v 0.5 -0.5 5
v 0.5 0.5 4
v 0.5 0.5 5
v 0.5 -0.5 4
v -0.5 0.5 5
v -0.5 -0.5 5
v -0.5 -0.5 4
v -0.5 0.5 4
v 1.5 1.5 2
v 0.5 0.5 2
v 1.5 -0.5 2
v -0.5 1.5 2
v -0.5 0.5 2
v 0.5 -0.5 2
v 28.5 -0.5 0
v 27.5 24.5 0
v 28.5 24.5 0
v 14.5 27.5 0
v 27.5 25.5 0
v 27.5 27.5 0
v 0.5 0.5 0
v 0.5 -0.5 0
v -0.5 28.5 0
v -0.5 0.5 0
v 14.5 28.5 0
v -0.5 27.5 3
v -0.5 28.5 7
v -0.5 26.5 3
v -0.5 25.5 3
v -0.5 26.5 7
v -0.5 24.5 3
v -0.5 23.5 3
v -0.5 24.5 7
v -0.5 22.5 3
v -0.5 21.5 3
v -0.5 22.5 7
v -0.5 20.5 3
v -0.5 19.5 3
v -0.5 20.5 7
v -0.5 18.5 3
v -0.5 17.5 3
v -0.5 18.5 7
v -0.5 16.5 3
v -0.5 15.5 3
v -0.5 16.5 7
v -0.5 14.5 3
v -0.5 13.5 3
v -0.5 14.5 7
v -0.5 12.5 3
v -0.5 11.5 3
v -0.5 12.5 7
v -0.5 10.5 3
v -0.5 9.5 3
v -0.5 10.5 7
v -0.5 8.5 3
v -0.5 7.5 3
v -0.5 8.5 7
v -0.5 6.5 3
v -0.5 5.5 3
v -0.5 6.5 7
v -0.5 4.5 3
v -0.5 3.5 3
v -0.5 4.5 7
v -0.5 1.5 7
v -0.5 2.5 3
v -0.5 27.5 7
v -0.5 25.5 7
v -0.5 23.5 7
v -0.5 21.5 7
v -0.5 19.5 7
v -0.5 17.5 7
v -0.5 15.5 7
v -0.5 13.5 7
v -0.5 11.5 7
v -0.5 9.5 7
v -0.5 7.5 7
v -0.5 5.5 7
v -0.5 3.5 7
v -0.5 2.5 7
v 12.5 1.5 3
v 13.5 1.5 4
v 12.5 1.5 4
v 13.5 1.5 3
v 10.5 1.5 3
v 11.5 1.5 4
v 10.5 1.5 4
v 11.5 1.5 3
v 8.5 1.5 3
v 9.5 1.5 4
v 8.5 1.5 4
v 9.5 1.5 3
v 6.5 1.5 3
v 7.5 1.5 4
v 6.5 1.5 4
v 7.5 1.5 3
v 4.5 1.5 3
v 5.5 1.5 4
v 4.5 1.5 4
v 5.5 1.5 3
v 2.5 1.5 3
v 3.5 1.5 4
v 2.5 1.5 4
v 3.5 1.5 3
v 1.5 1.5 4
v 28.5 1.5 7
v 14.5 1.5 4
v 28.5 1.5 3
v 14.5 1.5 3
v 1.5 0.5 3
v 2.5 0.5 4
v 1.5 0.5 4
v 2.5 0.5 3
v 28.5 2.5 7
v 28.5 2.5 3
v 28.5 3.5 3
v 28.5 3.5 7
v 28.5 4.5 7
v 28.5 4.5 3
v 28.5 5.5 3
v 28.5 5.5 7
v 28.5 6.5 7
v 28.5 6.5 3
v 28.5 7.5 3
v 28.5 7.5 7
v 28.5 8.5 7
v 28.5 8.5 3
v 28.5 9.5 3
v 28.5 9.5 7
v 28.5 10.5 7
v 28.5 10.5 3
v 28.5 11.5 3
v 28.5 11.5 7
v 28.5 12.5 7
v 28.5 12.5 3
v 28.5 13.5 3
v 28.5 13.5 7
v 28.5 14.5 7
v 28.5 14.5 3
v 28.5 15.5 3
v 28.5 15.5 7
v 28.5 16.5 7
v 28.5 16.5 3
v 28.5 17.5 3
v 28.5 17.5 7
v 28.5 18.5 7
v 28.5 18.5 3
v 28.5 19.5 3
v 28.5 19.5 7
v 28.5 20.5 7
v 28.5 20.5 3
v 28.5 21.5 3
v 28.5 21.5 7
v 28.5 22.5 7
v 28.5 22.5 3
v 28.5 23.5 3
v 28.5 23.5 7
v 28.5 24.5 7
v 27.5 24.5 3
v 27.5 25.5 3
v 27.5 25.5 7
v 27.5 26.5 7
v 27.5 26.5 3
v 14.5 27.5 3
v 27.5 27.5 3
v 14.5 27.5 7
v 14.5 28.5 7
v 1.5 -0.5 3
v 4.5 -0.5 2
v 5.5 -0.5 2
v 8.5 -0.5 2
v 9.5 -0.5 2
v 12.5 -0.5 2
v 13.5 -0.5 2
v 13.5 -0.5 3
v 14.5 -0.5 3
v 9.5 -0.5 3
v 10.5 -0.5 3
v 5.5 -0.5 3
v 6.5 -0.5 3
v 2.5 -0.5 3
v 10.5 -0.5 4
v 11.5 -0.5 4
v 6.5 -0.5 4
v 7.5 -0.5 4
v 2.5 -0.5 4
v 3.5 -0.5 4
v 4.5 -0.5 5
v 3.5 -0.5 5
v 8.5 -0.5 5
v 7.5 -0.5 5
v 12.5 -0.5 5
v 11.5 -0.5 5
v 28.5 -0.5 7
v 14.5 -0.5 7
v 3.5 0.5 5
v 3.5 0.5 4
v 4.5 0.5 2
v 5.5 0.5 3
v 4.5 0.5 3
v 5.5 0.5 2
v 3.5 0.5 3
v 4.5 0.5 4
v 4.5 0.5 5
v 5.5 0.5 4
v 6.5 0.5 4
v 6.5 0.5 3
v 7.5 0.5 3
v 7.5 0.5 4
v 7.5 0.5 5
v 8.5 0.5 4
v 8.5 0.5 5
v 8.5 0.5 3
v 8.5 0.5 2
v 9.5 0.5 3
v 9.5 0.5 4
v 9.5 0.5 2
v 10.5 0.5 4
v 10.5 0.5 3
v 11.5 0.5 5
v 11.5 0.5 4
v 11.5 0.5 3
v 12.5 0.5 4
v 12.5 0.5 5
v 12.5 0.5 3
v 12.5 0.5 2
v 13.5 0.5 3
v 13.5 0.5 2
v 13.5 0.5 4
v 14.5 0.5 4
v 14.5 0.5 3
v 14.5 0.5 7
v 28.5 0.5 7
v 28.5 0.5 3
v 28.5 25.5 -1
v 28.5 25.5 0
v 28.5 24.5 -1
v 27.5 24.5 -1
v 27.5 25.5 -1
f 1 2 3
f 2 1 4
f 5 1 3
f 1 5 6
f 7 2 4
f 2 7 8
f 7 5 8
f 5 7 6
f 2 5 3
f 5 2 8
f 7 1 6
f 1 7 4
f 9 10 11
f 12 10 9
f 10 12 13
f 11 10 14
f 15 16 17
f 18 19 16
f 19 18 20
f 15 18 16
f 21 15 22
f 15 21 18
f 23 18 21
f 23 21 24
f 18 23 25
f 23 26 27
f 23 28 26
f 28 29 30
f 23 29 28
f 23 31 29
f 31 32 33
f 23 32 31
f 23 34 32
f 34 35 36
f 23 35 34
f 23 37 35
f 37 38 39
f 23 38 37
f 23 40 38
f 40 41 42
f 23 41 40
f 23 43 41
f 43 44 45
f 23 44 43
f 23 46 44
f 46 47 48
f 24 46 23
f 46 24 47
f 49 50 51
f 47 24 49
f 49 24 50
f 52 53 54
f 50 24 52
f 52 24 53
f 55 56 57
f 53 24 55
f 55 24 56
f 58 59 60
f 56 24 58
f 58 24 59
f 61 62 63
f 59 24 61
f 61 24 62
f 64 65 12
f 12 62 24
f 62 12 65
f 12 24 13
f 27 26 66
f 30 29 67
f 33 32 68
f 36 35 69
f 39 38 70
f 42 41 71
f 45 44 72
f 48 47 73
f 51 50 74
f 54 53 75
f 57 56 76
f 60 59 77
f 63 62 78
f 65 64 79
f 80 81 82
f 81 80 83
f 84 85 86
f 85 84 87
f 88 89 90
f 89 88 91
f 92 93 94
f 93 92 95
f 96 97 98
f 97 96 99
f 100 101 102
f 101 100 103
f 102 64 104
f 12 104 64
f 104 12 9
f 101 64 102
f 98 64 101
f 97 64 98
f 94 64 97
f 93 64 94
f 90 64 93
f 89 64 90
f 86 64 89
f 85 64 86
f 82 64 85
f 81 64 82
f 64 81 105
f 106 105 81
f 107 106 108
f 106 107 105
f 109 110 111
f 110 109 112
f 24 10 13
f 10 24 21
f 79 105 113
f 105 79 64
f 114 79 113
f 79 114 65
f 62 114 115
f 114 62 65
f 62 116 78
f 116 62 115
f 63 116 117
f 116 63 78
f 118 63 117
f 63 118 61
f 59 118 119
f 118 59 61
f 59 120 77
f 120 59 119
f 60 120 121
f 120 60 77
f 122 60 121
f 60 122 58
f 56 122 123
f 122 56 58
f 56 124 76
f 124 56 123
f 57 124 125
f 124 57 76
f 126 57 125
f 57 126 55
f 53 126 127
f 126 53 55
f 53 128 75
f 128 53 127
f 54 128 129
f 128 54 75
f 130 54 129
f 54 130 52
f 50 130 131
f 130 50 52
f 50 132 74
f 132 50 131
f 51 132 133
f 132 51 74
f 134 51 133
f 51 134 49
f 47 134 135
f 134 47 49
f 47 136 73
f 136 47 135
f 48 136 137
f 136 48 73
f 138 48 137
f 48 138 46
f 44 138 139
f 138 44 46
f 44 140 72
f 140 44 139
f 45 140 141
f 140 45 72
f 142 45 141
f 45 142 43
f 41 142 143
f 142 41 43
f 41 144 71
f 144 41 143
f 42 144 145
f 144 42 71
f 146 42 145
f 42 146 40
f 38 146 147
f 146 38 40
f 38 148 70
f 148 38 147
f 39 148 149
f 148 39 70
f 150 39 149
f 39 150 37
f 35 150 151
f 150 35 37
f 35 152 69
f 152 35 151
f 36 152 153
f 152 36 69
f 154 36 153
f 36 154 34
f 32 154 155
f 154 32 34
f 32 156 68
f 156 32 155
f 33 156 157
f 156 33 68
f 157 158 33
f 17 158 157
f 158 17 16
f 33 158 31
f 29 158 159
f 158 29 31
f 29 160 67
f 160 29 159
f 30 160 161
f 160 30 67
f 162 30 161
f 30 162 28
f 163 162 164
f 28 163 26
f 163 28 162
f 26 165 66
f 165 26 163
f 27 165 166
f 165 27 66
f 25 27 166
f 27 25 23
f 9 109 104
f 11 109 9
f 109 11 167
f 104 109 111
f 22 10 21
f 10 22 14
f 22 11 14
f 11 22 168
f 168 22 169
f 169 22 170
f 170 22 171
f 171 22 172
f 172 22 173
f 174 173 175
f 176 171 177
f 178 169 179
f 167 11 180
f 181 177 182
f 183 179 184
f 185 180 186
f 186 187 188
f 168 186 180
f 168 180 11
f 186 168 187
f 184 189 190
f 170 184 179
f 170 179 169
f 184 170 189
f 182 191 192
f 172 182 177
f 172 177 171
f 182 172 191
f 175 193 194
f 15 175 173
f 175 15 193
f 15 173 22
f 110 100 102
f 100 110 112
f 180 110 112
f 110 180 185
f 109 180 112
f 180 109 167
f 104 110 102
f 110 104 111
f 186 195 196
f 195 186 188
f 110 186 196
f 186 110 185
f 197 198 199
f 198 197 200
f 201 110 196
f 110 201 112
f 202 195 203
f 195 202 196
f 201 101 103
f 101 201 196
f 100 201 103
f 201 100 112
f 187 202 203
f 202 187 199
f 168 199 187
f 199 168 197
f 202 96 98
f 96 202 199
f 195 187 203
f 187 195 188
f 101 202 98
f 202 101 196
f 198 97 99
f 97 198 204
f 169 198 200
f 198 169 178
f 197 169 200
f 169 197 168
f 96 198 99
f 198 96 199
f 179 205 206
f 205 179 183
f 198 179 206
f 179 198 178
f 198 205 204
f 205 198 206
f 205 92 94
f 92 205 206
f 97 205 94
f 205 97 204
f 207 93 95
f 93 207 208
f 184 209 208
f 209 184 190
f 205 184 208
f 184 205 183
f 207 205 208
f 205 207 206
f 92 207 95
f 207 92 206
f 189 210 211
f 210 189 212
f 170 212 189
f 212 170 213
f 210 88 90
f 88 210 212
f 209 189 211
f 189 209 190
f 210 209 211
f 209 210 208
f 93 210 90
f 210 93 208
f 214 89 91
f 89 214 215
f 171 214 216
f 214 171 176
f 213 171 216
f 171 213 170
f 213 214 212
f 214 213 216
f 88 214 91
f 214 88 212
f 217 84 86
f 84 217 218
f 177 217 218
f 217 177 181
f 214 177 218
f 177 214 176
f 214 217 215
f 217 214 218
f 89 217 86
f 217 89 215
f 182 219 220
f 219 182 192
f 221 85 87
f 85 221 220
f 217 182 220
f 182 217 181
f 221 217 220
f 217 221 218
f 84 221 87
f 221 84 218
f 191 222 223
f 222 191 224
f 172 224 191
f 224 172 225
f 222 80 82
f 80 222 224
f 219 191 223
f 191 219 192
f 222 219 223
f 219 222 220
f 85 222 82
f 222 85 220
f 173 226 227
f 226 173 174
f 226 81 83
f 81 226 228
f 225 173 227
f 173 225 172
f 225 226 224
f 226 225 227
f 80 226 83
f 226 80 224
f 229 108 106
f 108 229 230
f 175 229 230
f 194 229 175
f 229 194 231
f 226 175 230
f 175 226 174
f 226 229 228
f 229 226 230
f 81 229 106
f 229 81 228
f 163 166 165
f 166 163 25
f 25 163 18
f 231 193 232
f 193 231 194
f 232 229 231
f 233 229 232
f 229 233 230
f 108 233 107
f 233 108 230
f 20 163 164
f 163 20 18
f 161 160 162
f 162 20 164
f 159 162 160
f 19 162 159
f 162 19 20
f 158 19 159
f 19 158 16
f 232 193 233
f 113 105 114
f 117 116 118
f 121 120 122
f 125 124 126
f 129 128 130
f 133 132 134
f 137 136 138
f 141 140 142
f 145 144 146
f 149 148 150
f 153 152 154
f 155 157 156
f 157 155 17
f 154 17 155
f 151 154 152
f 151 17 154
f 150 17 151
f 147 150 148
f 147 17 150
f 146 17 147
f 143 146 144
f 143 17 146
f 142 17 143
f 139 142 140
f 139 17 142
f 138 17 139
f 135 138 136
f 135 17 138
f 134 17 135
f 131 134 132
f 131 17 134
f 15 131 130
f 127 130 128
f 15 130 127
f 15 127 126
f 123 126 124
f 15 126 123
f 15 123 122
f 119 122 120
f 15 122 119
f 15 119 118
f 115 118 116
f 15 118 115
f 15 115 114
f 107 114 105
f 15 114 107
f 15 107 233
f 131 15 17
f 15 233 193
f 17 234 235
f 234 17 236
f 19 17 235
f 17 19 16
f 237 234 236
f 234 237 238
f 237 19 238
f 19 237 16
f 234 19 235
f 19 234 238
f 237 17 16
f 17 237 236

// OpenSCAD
union() {
    translate([0, 0, 4.5]) color([1, 0, 0]) cube([1, 1, 1], center=true);
    translate([0, 1, 1.0]) cube([1, 1, 2], center=true);
    translate([0, 2, 3.5]) cube([1, 1, 7], center=true);
    translate([0, 3, 1.5]) cube([1, 1, 3], center=true);
    translate([0, 4, 3.5]) cube([1, 1, 7], center=true);
    translate([0, 5, 1.5]) cube([1, 1, 3], center=true);
    translate([0, 6, 3.5]) cube([1, 1, 7], center=true);
    translate([0, 7, 1.5]) cube([1, 1, 3], center=true);
    translate([0, 8, 3.5]) cube([1, 1, 7], center=true);
    translate([0, 9, 1.5]) cube([1, 1, 3], center=true);
    translate([0, 10, 3.5]) cube([1, 1, 7], center=true);
    translate([0, 11, 1.5]) cube([1, 1, 3], center=true);
    translate([0, 12, 3.5]) cube([1, 1, 7], center=true);
    translate([0, 13, 1.5]) cube([1, 1, 3], center=true);
    translate([0, 14, 3.5]) cube([1, 1, 7], center=true);
    translate([0, 15, 1.5]) cube([1, 1, 3], center=true);
    translate([0, 16, 3.5]) cube([1, 1, 7], center=true);
    translate([0, 17, 1.5]) cube([1, 1, 3], center=true);
    translate([0, 18, 3.5]) cube([1, 1, 7], center=true);
    translate([0, 19, 1.5]) cube([1, 1, 3], center=true);
    translate([0, 20, 3.5]) cube([1, 1, 7], center=true);
    translate([0, 21, 1.5]) cube([1, 1, 3], center=true);
    translate([0, 22, 3.5]) cube([1, 1, 7], center=true);
    translate([0, 23, 1.5]) cube([1, 1, 3], center=true);
    translate([0, 24, 3.5]) cube([1, 1, 7], center=true);
    translate([0, 25, 1.5]) cube([1, 1, 3], center=true);
    translate([0, 26, 3.5]) cube([1, 1, 7], center=true);
    translate([0, 27, 1.5]) cube([1, 1, 3], center=true);
    translate([0, 28, 3.5]) cube([1, 1, 7], center=true);
    translate([1, 0, 1.0]) cube([1, 1, 2], center=true);
    translate([1, 1, 1.0]) cube([1, 1, 2], center=true);
    translate([1, 2, 3.5]) cube([1, 1, 7], center=true);
    translate([1, 3, 1.5]) cube([1, 1, 3], center=true);
    translate([1, 4, 3.5]) cube([1, 1, 7], center=true);
    translate([1, 5, 1.5]) cube([1, 1, 3], center=true);
    translate([1, 6, 3.5]) cube([1, 1, 7], center=true);
    translate([1, 7, 1.5]) cube([1, 1, 3], center=true);
    translate([1, 8, 3.5]) cube([1, 1, 7], center=true);
    translate([1, 9, 1.5]) cube([1, 1, 3], center=true);
    translate([1, 10, 3.5]) cube([1, 1, 7], center=true);
    translate([1, 11, 1.5]) cube([1, 1, 3], center=true);
    translate([1, 12, 3.5]) cube([1, 1, 7], center=true);
    translate([1, 13, 1.5]) cube([1, 1, 3], center=true);
    translate([1, 14, 3.5]) cube([1, 1, 7], center=true);
    translate([1, 15, 1.5]) cube([1, 1, 3], center=true);
    translate([1, 16, 3.5]) cube([1, 1, 7], center=true);
    translate([1, 17, 1.5]) cube([1, 1, 3], center=true);
    translate([1, 18, 3.5]) cube([1, 1, 7], center=true);
    translate([1, 19, 1.5]) cube([1, 1, 3], center=true);
    translate([1, 20, 3.5]) cube([1, 1, 7], center=true);
    translate([1, 21, 1.5]) cube([1, 1, 3], center=true);
    translate([1, 22, 3.5]) cube([1, 1, 7], center=true);
    translate([1, 23, 1.5]) cube([1, 1, 3], center=true);
    translate([1, 24, 3.5]) cube([1, 1, 7], center=true);
    translate([1, 25, 1.5]) cube([1, 1, 3], center=true);
    translate([1, 26, 3.5]) cube([1, 1, 7], center=true);
    translate([1, 27, 1.5]) cube([1, 1, 3], center=true);
    translate([1, 28, 3.5]) cube([1, 1, 7], center=true);
    translate([2, 0, 1.5]) cube([1, 1, 3], center=true);
    translate([2, 1, 2.0]) cube([1, 1, 4], center=true);
    translate([2, 2, 3.5]) cube([1, 1, 7], center=true);
    translate([2, 3, 1.5]) cube([1, 1, 3], center=true);
    translate([2, 4, 3.5]) cube([1, 1, 7], center=true);
    translate([2, 5, 1.5]) cube([1, 1, 3], center=true);
    translate([2, 6, 3.5]) cube([1, 1, 7], center=true);
    translate([2, 7, 1.5]) cube([1, 1, 3], center=true);
    translate([2, 8, 3.5]) cube([1, 1, 7], center=true);
    translate([2, 9, 1.5]) cube([1, 1, 3], center=true);
    translate([2, 10, 3.5]) cube([1, 1, 7], center=true);
    translate([2, 11, 1.5]) cube([1, 1, 3], center=true);
    translate([2, 12, 3.5]) cube([1, 1, 7], center=true);
    translate([2, 13, 1.5]) cube([1, 1, 3], center=true);
    translate([2, 14, 3.5]) cube([1, 1, 7], center=true);
    translate([2, 15, 1.5]) cube([1, 1, 3], center=true);
    translate([2, 16, 3.5]) cube([1, 1, 7], center=true);
    translate([2, 17, 1.5]) cube([1, 1, 3], center=true);
    translate([2, 18, 3.5]) cube([1, 1, 7], center=true);
    translate([2, 19, 1.5]) cube([1, 1, 3], center=true);
    translate([2, 20, 3.5]) cube([1, 1, 7], center=true);
    translate([2, 21, 1.5]) cube([1, 1, 3], center=true);
    translate([2, 22, 3.5]) cube([1, 1, 7], center=true);
    translate([2, 23, 1.5]) cube([1, 1, 3], center=true);
    translate([2, 24, 3.5]) cube([1, 1, 7], center=true);
    translate([2, 25, 1.5]) cube([1, 1, 3], center=true);
    translate([2, 26, 3.5]) cube([1, 1, 7], center=true);
    translate([2, 27, 1.5]) cube([1, 1, 3], center=true);
    translate([2, 28, 3.5]) cube([1, 1, 7], center=true);
    translate([3, 0, 2.0]) cube([1, 1, 4], center=true);
    translate([3, 1, 1.5]) cube([1, 1, 3], center=true);
    translate([3, 2, 3.5]) cube([1, 1, 7], center=true);
    translate([3, 3, 1.5]) cube([1, 1, 3], center=true);
    translate([3, 4, 3.5]) cube([1, 1, 7], center=true);
    translate([3, 5, 1.5]) cube([1, 1, 3], center=true);
    translate([3, 6, 3.5]) cube([1, 1, 7], center=true);
    translate([3, 7, 1.5]) cube([1, 1, 3], center=true);
    translate([3, 8, 3.5]) cube([1, 1, 7], center=true);
    translate([3, 9, 1.5]) cube([1, 1, 3], center=true);
    translate([3, 10, 3.5]) cube([1, 1, 7], center=true);
    translate([3, 11, 1.5]) cube([1, 1, 3], center=true);
    translate([3, 12, 3.5]) cube([1, 1, 7], center=true);
    translate([3, 13, 1.5]) cube([1, 1, 3], center=true);
    translate([3, 14, 3.5]) cube([1, 1, 7], center=true);
    translate([3, 15, 1.5]) cube([1, 1, 3], center=true);
    translate([3, 16, 3.5]) cube([1, 1, 7], center=true);
    translate([3, 17, 1.5]) cube([1, 1, 3], center=true);
    translate([3, 18, 3.5]) cube([1, 1, 7], center=true);
    translate([3, 19, 1.5]) cube([1, 1, 3], center=true);
    translate([3, 20, 3.5]) cube([1, 1, 7], center=true);
    translate([3, 21, 1.5]) cube([1, 1, 3], center=true);
    translate([3, 22, 3.5]) cube([1, 1, 7], center=true);
    translate([3, 23, 1.5]) cube([1, 1, 3], center=true);
    translate([3, 24, 3.5]) cube([1, 1, 7], center=true);
    translate([3, 25, 1.5]) cube([1, 1, 3], center=true);
    translate([3, 26, 3.5]) cube([1, 1, 7], center=true);
    translate([3, 27, 1.5]) cube([1, 1, 3], center=true);
    translate([3, 28, 3.5]) cube([1, 1, 7], center=true);
    translate([4, 0, 2.5]) cube([1, 1, 5], center=true);
    translate([4, 1, 2.0]) cube([1, 1, 4], center=true);
    translate([4, 2, 3.5]) cube([1, 1, 7], center=true);
    translate([4, 3, 1.5]) cube([1, 1, 3], center=true);
    translate([4, 4, 3.5]) cube([1, 1, 7], center=true);
    translate([4, 5, 1.5]) cube([1, 1, 3], center=true);
    translate([4, 6, 3.5]) cube([1, 1, 7], center=true);
    translate([4, 7, 1.5]) cube([1, 1, 3], center=true);
    translate([4, 8, 3.5]) cube([1, 1, 7], center=true);
    translate([4, 9, 1.5]) cube([1, 1, 3], center=true);
    translate([4, 10, 3.5]) cube([1, 1, 7], center=true);
    translate([4, 11, 1.5]) cube([1, 1, 3], center=true);
    translate([4, 12, 3.5]) cube([1, 1, 7], center=true);
    translate([4, 13, 1.5]) cube([1, 1, 3], center=true);
    translate([4, 14, 3.5]) cube([1, 1, 7], center=true);
    translate([4, 15, 1.5]) cube([1, 1, 3], center=true);
    translate([4, 16, 3.5]) cube([1, 1, 7], center=true);
    translate([4, 17, 1.5]) cube([1, 1, 3], center=true);
    translate([4, 18, 3.5]) cube([1, 1, 7], center=true);
    translate([4, 19, 1.5]) cube([1, 1, 3], center=true);
    translate([4, 20, 3.5]) cube([1, 1, 7], center=true);
    translate([4, 21, 1.5]) cube([1, 1, 3], center=true);
    translate([4, 22, 3.5]) cube([1, 1, 7], center=true);
    translate([4, 23, 1.5]) cube([1, 1, 3], center=true);
    translate([4, 24, 3.5]) cube([1, 1, 7], center=true);
    translate([4, 25, 1.5]) cube([1, 1, 3], center=true);
    translate([4, 26, 3.5]) cube([1, 1, 7], center=true);
    translate([4, 27, 1.5]) cube([1, 1, 3], center=true);
    translate([4, 28, 3.5]) cube([1, 1, 7], center=true);
    translate([5, 0, 1.0]) cube([1, 1, 2], center=true);
    translate([5, 1, 1.5]) cube([1, 1, 3], center=true);
    translate([5, 2, 3.5]) cube([1, 1, 7], center=true);
    translate([5, 3, 1.5]) cube([1, 1, 3], center=true);
    translate([5, 4, 3.5]) cube([1, 1, 7], center=true);
    translate([5, 5, 1.5]) cube([1, 1, 3], center=true);
    translate([5, 6, 3.5]) cube([1, 1, 7], center=true);
    translate([5, 7, 1.5]) cube([1, 1, 3], center=true);
    translate([5, 8, 3.5]) cube([1, 1, 7], center=true);
    translate([5, 9, 1.5]) cube([1, 1, 3], center=true);
    translate([5, 10, 3.5]) cube([1, 1, 7], center=true);
    translate([5, 11, 1.5]) cube([1, 1, 3], center=true);
    translate([5, 12, 3.5]) cube([1, 1, 7], center=true);
    translate([5, 13, 1.5]) cube([1, 1, 3], center=true);
    translate([5, 14, 3.5]) cube([1, 1, 7], center=true);
    translate([5, 15, 1.5]) cube([1, 1, 3], center=true);
    translate([5, 16, 3.5]) cube([1, 1, 7], center=true);
    translate([5, 17, 1.5]) cube([1, 1, 3], center=true);
    translate([5, 18, 3.5]) cube([1, 1, 7], center=true);
    translate([5, 19, 1.5]) cube([1, 1, 3], center=true);
    translate([5, 20, 3.5]) cube([1, 1, 7], center=true);
    translate([5, 21, 1.5]) cube([1, 1, 3], center=true);
    translate([5, 22, 3.5]) cube([1, 1, 7], center=true);
    translate([5, 23, 1.5]) cube([1, 1, 3], center=true);
    translate([5, 24, 3.5]) cube([1, 1, 7], center=true);
    translate([5, 25, 1.5]) cube([1, 1, 3], center=true);
    translate([5, 26, 3.5]) cube([1, 1, 7], center=true);
    translate([5, 27, 1.5]) cube([1, 1, 3], center=true);
    translate([5, 28, 3.5]) cube([1, 1, 7], center=true);
    translate([6, 0, 1.5]) cube([1, 1, 3], center=true);
    translate([6, 1, 2.0]) cube([1, 1, 4], center=true);
    translate([6, 2, 3.5]) cube([1, 1, 7], center=true);
    translate([6, 3, 1.5]) cube([1, 1, 3], center=true);
    translate([6, 4, 3.5]) cube([1, 1, 7], center=true);
    translate([6, 5, 1.5]) cube([1, 1, 3], center=true);
    translate([6, 6, 3.5]) cube([1, 1, 7], center=true);
    translate([6, 7, 1.5]) cube([1, 1, 3], center=true);
    translate([6, 8, 3.5]) cube([1, 1, 7], center=true);
    translate([6, 9, 1.5]) cube([1, 1, 3], center=true);
    translate([6, 10, 3.5]) cube([1, 1, 7], center=true);
    translate([6, 11, 1.5]) cube([1, 1, 3], center=true);
    translate([6, 12, 3.5]) cube([1, 1, 7], center=true);
    translate([6, 13, 1.5]) cube([1, 1, 3], center=true);
    translate([6, 14, 3.5]) cube([1, 1, 7], center=true);
    translate([6, 15, 1.5]) cube([1, 1, 3], center=true);
    translate([6, 16, 3.5]) cube([1, 1, 7], center=true);
    translate([6, 17, 1.5]) cube([1, 1, 3], center=true);
    translate([6, 18, 3.5]) cube([1, 1, 7], center=true);
    translate([6, 19, 1.5]) cube([1, 1, 3], center=true);
    translate([6, 20, 3.5]) cube([1, 1, 7], center=true);
    translate([6, 21, 1.5]) cube([1, 1, 3], center=true);
    translate([6, 22, 3.5]) cube([1, 1, 7], center=true);
    translate([6, 23, 1.5]) cube([1, 1, 3], center=true);
    translate([6, 24, 3.5]) cube([1, 1, 7], center=true);
    translate([6, 25, 1.5]) cube([1, 1, 3], center=true);
    translate([6, 26, 3.5]) cube([1, 1, 7], center=true);
    translate([6, 27, 1.5]) cube([1, 1, 3], center=true);
    translate([6, 28, 3.5]) cube([1, 1, 7], center=true);
    translate([7, 0, 2.0]) cube([1, 1, 4], center=true);
    translate([7, 1, 1.5]) cube([1, 1, 3], center=true);
    translate([7, 2, 3.5]) cube([1, 1, 7], center=true);
    translate([7, 3, 1.5]) cube([1, 1, 3], center=true);
    translate([7, 4, 3.5]) cube([1, 1, 7], center=true);
    translate([7, 5, 1.5]) cube([1, 1, 3], center=true);
    translate([7, 6, 3.5]) cube([1, 1, 7], center=true);
    translate([7, 7, 1.5]) cube([1, 1, 3], center=true);
    translate([7, 8, 3.5]) cube([1, 1, 7], center=true);
    translate([7, 9, 1.5]) cube([1, 1, 3], center=true);
    translate([7, 10, 3.5]) cube([1, 1, 7], center=true);
    translate([7, 11, 1.5]) cube([1, 1, 3], center=true);
    translate([7, 12, 3.5]) cube([1, 1, 7], center=true);
    translate([7, 13, 1.5]) cube([1, 1, 3], center=true);
    translate([7, 14, 3.5]) cube([1, 1, 7], center=true);
    translate([7, 15, 1.5]) cube([1, 1, 3], center=true);
    translate([7, 16, 3.5]) cube([1, 1, 7], center=true);
    translate([7, 17, 1.5]) cube([1, 1, 3], center=true);
    translate([7, 18, 3.5]) cube([1, 1, 7], center=true);
    translate([7, 19, 1.5]) cube([1, 1, 3], center=true);
    translate([7, 20, 3.5]) cube([1, 1, 7], center=true);
    translate([7, 21, 1.5]) cube([1, 1, 3], center=true);
    translate([7, 22, 3.5]) cube([1, 1, 7], center=true);
    translate([7, 23, 1.5]) cube([1, 1, 3], center=true);
    translate([7, 24, 3.5]) cube([1, 1, 7], center=true);
    translate([7, 25, 1.5]) cube([1, 1, 3], center=true);
    translate([7, 26, 3.5]) cube([1, 1, 7], center=true);
    translate([7, 27, 1.5]) cube([1, 1, 3], center=true);
    translate([7, 28, 3.5]) cube([1, 1, 7], center=true);
    translate([8, 0, 2.5]) cube([1, 1, 5], center=true);
    translate([8, 1, 2.0]) cube([1, 1, 4], center=true);
    translate([8, 2, 3.5]) cube([1, 1, 7], center=true);
    translate([8, 3, 1.5]) cube([1, 1, 3], center=true);
    translate([8, 4, 3.5]) cube([1, 1, 7], center=true);
    translate([8, 5, 1.5]) cube([1, 1, 3], center=true);
    translate([8, 6, 3.5]) cube([1, 1, 7], center=true);
    translate([8, 7, 1.5]) cube([1, 1, 3], center=true);
    translate([8, 8, 3.5]) cube([1, 1, 7], center=true);
    translate([8, 9, 1.5]) cube([1, 1, 3], center=true);
    translate([8, 10, 3.5]) cube([1, 1, 7], center=true);
    translate([8, 11, 1.5]) cube([1, 1, 3], center=true);
    translate([8, 12, 3.5]) cube([1, 1, 7], center=true);
    translate([8, 13, 1.5]) cube([1, 1, 3], center=true);
    translate([8, 14, 3.5]) cube([1, 1, 7], center=true);
    translate([8, 15, 1.5]) cube([1, 1, 3], center=true);
    translate([8, 16, 3.5]) cube([1, 1, 7], center=true);
    translate([8, 17, 1.5]) cube([1, 1, 3], center=true);
    translate([8, 18, 3.5]) cube([1, 1, 7], center=true);
    translate([8, 19, 1.5]) cube([1, 1, 3], center=true);
    translate([8, 20, 3.5]) cube([1, 1, 7], center=true);
    translate([8, 21, 1.5]) cube([1, 1, 3], center=true);
    translate([8, 22, 3.5]) cube([1, 1, 7], center=true);
    translate([8, 23, 1.5]) cube([1, 1, 3], center=true);
    translate([8, 24, 3.5]) cube([1, 1, 7], center=true);
    translate([8, 25, 1.5]) cube([1, 1, 3], center=true);
    translate([8, 26, 3.5]) cube([1, 1, 7], center=true);
    translate([8, 27, 1.5]) cube([1, 1, 3], center=true);
    translate([8, 28, 3.5]) cube([1, 1, 7], center=true);
    translate([9, 0, 1.0]) cube([1, 1, 2], center=true);
    translate([9, 1, 1.5]) cube([1, 1, 3], center=true);
    translate([9, 2, 3.5]) cube([1, 1, 7], center=true);
    translate([9, 3, 1.5]) cube([1, 1, 3], center=true);
    translate([9, 4, 3.5]) cube([1, 1, 7], center=true);
    translate([9, 5, 1.5]) cube([1, 1, 3], center=true);
    translate([9, 6, 3.5]) cube([1, 1, 7], center=true);
    translate([9, 7, 1.5]) cube([1, 1, 3], center=true);
    translate([9, 8, 3.5]) cube([1, 1, 7], center=true);
    translate([9, 9, 1.5]) cube([1, 1, 3], center=true);
    translate([9, 10, 3.5]) cube([1, 1, 7], center=true);
    translate([9, 11, 1.5]) cube([1, 1, 3], center=true);
    translate([9, 12, 3.5]) cube([1, 1, 7], center=true);
    translate([9, 13, 1.5]) cube([1, 1, 3], center=true);
    translate([9, 14, 3.5]) cube([1, 1, 7], center=true);
    translate([9, 15, 1.5]) cube([1, 1, 3], center=true);
    translate([9, 16, 3.5]) cube([1, 1, 7], center=true);
    translate([9, 17, 1.5]) cube([1, 1, 3], center=true);
    translate([9, 18, 3.5]) cube([1, 1, 7], center=true);
    translate([9, 19, 1.5]) cube([1, 1, 3], center=true);
    translate([9, 20, 3.5]) cube([1, 1, 7], center=true);
    translate([9, 21, 1.5]) cube([1, 1, 3], center=true);
    translate([9, 22, 3.5]) cube([1, 1, 7], center=true);
    translate([9, 23, 1.5]) cube([1, 1, 3], center=true);
    translate([9, 24, 3.5]) cube([1, 1, 7], center=true);
    translate([9, 25, 1.5]) cube([1, 1, 3], center=true);
    translate([9, 26, 3.5]) cube([1, 1, 7], center=true);
    translate([9, 27, 1.5]) cube([1, 1, 3], center=true);
    translate([9, 28, 3.5]) cube([1, 1, 7], center=true);
    translate([10, 0, 1.5]) cube([1, 1, 3], center=true);
    translate([10, 1, 2.0]) cube([1, 1, 4], center=true);
    translate([10, 2, 3.5]) cube([1, 1, 7], center=true);
    translate([10, 3, 1.5]) cube([1, 1, 3], center=true);
    translate([10, 4, 3.5]) cube([1, 1, 7], center=true);
    translate([10, 5, 1.5]) cube([1, 1, 3], center=true);
    translate([10, 6, 3.5]) cube([1, 1, 7], center=true);
    translate([10, 7, 1.5]) cube([1, 1, 3], center=true);
    translate([10, 8, 3.5]) cube([1, 1, 7], center=true);
    translate([10, 9, 1.5]) cube([1, 1, 3], center=true);
    translate([10, 10, 3.5]) cube([1, 1, 7], center=true);
    translate([10, 11, 1.5]) cube([1, 1, 3], center=true);
    translate([10, 12, 3.5]) cube([1, 1, 7], center=true);
    translate([10, 13, 1.5]) cube([1, 1, 3], center=true);
    translate([10, 14, 3.5]) cube([1, 1, 7], center=true);
    translate([10, 15, 1.5]) cube([1, 1, 3], center=true);
    translate([10, 16, 3.5]) cube([1, 1, 7], center=true);
    translate([10, 17, 1.5]) cube([1, 1, 3], center=true);
    translate([10, 18, 3.5]) cube([1, 1, 7], center=true);
    translate([10, 19, 1.5]) cube([1, 1, 3], center=true);
    translate([10, 20, 3.5]) cube([1, 1, 7], center=true);
    translate([10, 21, 1.5]) cube([1, 1, 3], center=true);
    translate([10, 22, 3.5]) cube([1, 1, 7], center=true);
    translate([10, 23, 1.5]) cube([1, 1, 3], center=true);
    translate([10, 24, 3.5]) cube([1, 1, 7], center=true);
    translate([10, 25, 1.5]) cube([1, 1, 3], center=true);
    translate([10, 26, 3.5]) cube([1, 1, 7], center=true);
    translate([10, 27, 1.5]) cube([1, 1, 3], center=true);
    translate([10, 28, 3.5]) cube([1, 1, 7], center=true);
    translate([11, 0, 2.0]) cube([1, 1, 4], center=true);
    translate([11, 1, 1.5]) cube([1, 1, 3], center=true);
    translate([11, 2, 3.5]) cube([1, 1, 7], center=true);
    translate([11, 3, 1.5]) cube([1, 1, 3], center=true);
    translate([11, 4, 3.5]) cube([1, 1, 7], center=true);
    translate([11, 5, 1.5]) cube([1, 1, 3], center=true);
    translate([11, 6, 3.5]) cube([1, 1, 7], center=true);
    translate([11, 7, 1.5]) cube([1, 1, 3], center=true);
    translate([11, 8, 3.5]) cube([1, 1, 7], center=true);
    translate([11, 9, 1.5]) cube([1, 1, 3], center=true);
    translate([11, 10, 3.5]) cube([1, 1, 7], center=true);
    translate([11, 11, 1.5]) cube([1, 1, 3], center=true);
    translate([11, 12, 3.5]) cube([1, 1, 7], center=true);
    translate([11, 13, 1.5]) cube([1, 1, 3], center=true);
    translate([11, 14, 3.5]) cube([1, 1, 7], center=true);
    translate([11, 15, 1.5]) cube([1, 1, 3], center=true);
    translate([11, 16, 3.5]) cube([1, 1, 7], center=true);
    translate([11, 17, 1.5]) cube([1, 1, 3], center=true);
    translate([11, 18, 3.5]) cube([1, 1, 7], center=true);
    translate([11, 19, 1.5]) cube([1, 1, 3], center=true);
    translate([11, 20, 3.5]) cube([1, 1, 7], center=true);
    translate([11, 21, 1.5]) cube([1, 1, 3], center=true);
    translate([11, 22, 3.5]) cube([1, 1, 7], center=true);
    translate([11, 23, 1.5]) cube([1, 1, 3], center=true);
    translate([11, 24, 3.5]) cube([1, 1, 7], center=true);
    translate([11, 25, 1.5]) cube([1, 1, 3], center=true);
    translate([11, 26, 3.5]) cube([1, 1, 7], center=true);
    translate([11, 27, 1.5]) cube([1, 1, 3], center=true);
    translate([11, 28, 3.5]) cube([1, 1, 7], center=true);
    translate([12, 0, 2.5]) cube([1, 1, 5], center=true);
    translate([12, 1, 2.0]) cube([1, 1, 4], center=true);
    translate([12, 2, 3.5]) cube([1, 1, 7], center=true);
    translate([12, 3, 1.5]) cube([1, 1, 3], center=true);
    translate([12, 4, 3.5]) cube([1, 1, 7], center=true);
    translate([12, 5, 1.5]) cube([1, 1, 3], center=true);
    translate([12, 6, 3.5]) cube([1, 1, 7], center=true);
    translate([12, 7, 1.5]) cube([1, 1, 3], center=true);
    translate([12, 8, 3.5]) cube([1, 1, 7], center=true);
    translate([12, 9, 1.5]) cube([1, 1, 3], center=true);
    translate([12, 10, 3.5]) cube([1, 1, 7], center=true);
    translate([12, 11, 1.5]) cube([1, 1, 3], center=true);
    translate([12, 12, 3.5]) cube([1, 1, 7], center=true);
    translate([12, 13, 1.5]) cube([1, 1, 3], center=true);
    translate([12, 14, 3.5]) cube([1, 1, 7], center=true);
    translate([12, 15, 1.5]) cube([1, 1, 3], center=true);
    translate([12, 16, 3.5]) cube([1, 1, 7], center=true);
    translate([12, 17, 1.5]) cube([1, 1, 3], center=true);
    translate([12, 18, 3.5]) cube([1, 1, 7], center=true);
    translate([12, 19, 1.5]) cube([1, 1, 3], center=true);
    translate([12, 20, 3.5]) cube([1, 1, 7], center=true);
    translate([12, 21, 1.5]) cube([1, 1, 3], center=true);
    translate([12, 22, 3.5]) cube([1, 1, 7], center=true);
    translate([12, 23, 1.5]) cube([1, 1, 3], center=true);
    translate([12, 24, 3.5]) cube([1, 1, 7], center=true);
    translate([12, 25, 1.5]) cube([1, 1, 3], center=true);
    translate([12, 26, 3.5]) cube([1, 1, 7], center=true);
    translate([12, 27, 1.5]) cube([1, 1, 3], center=true);
    translate([12, 28, 3.5]) cube([1, 1, 7], center=true);
    translate([13, 0, 1.0]) cube([1, 1, 2], center=true);
    translate([13, 1, 1.5]) cube([1, 1, 3], center=true);
    translate([13, 2, 3.5]) cube([1, 1, 7], center=true);
    translate([13, 3, 1.5]) cube([1, 1, 3], center=true);
    translate([13, 4, 3.5]) cube([1, 1, 7], center=true);
    translate([13, 5, 1.5]) cube([1, 1, 3], center=true);
    translate([13, 6, 3.5]) cube([1, 1, 7], center=true);
    translate([13, 7, 1.5]) cube([1, 1, 3], center=true);
    translate([13, 8, 3.5]) cube([1, 1, 7], center=true);
    translate([13, 9, 1.5]) cube([1, 1, 3], center=true);
    translate([13, 10, 3.5]) cube([1, 1, 7], center=true);
    translate([13, 11, 1.5]) cube([1, 1, 3], center=true);
    translate([13, 12, 3.5]) cube([1, 1, 7], center=true);
    translate([13, 13, 1.5]) cube([1, 1, 3], center=true);
    translate([13, 14, 3.5]) cube([1, 1, 7], center=true);
    translate([13, 15, 1.5]) cube([1, 1, 3], center=true);
    translate([13, 16, 3.5]) cube([1, 1, 7], center=true);
    translate([13, 17, 1.5]) cube([1, 1, 3], center=true);
    translate([13, 18, 3.5]) cube([1, 1, 7], center=true);
    translate([13, 19, 1.5]) cube([1, 1, 3], center=true);
    translate([13, 20, 3.5]) cube([1, 1, 7], center=true);
    translate([13, 21, 1.5]) cube([1, 1, 3], center=true);
    translate([13, 22, 3.5]) cube([1, 1, 7], center=true);
    translate([13, 23, 1.5]) cube([1, 1, 3], center=true);
    translate([13, 24, 3.5]) cube([1, 1, 7], center=true);
    translate([13, 25, 1.5]) cube([1, 1, 3], center=true);
    translate([13, 26, 3.5]) cube([1, 1, 7], center=true);
    translate([13, 27, 1.5]) cube([1, 1, 3], center=true);
    translate([13, 28, 3.5]) cube([1, 1, 7], center=true);
    translate([14, 0, 1.5]) cube([1, 1, 3], center=true);
    translate([14, 1, 2.0]) cube([1, 1, 4], center=true);
    translate([14, 2, 3.5]) cube([1, 1, 7], center=true);
    translate([14, 3, 1.5]) cube([1, 1, 3], center=true);
    translate([14, 4, 3.5]) cube([1, 1, 7], center=true);
    translate([14, 5, 1.5]) cube([1, 1, 3], center=true);
    translate([14, 6, 3.5]) cube([1, 1, 7], center=true);
    translate([14, 7, 1.5]) cube([1, 1, 3], center=true);
    translate([14, 8, 3.5]) cube([1, 1, 7], center=true);
    translate([14, 9, 1.5]) cube([1, 1, 3], center=true);
    translate([14, 10, 3.5]) cube([1, 1, 7], center=true);
    translate([14, 11, 1.5]) cube([1, 1, 3], center=true);
    translate([14, 12, 3.5]) cube([1, 1, 7], center=true);
    translate([14, 13, 1.5]) cube([1, 1, 3], center=true);
    translate([14, 14, 3.5]) cube([1, 1, 7], center=true);
    translate([14, 15, 1.5]) cube([1, 1, 3], center=true);
    translate([14, 16, 3.5]) cube([1, 1, 7], center=true);
    translate([14, 17, 1.5]) cube([1, 1, 3], center=true);
    translate([14, 18, 3.5]) cube([1, 1, 7], center=true);
    translate([14, 19, 1.5]) cube([1, 1, 3], center=true);
    translate([14, 20, 3.5]) cube([1, 1, 7], center=true);
    translate([14, 21, 1.5]) cube([1, 1, 3], center=true);
    translate([14, 22, 3.5]) cube([1, 1, 7], center=true);
    translate([14, 23, 1.5]) cube([1, 1, 3], center=true);
    translate([14, 24, 3.5]) cube([1, 1, 7], center=true);
    translate([14, 25, 1.5]) cube([1, 1, 3], center=true);
    translate([14, 26, 3.5]) cube([1, 1, 7], center=true);
    translate([14, 27, 1.5]) cube([1, 1, 3], center=true);
    translate([14, 28, 3.5]) cube([1, 1, 7], center=true);
    translate([15, 0, 3.5]) cube([1, 1, 7], center=true);
    translate([15, 1, 1.5]) cube([1, 1, 3], center=true);
    translate([15, 2, 3.5]) cube([1, 1, 7], center=true);
    translate([15, 3, 1.5]) cube([1, 1, 3], center=true);
    translate([15, 4, 3.5]) cube([1, 1, 7], center=true);
    translate([15, 5, 1.5]) cube([1, 1, 3], center=true);
    translate([15, 6, 3.5]) cube([1, 1, 7], center=true);
    translate([15, 7, 1.5]) cube([1, 1, 3], center=true);
    translate([15, 8, 3.5]) cube([1, 1, 7], center=true);
    translate([15, 9, 1.5]) cube([1, 1, 3], center=true);
    translate([15, 10, 3.5]) cube([1, 1, 7], center=true);
    translate([15, 11, 1.5]) cube([1, 1, 3], center=true);
    translate([15, 12, 3.5]) cube([1, 1, 7], center=true);
    translate([15, 13, 1.5]) cube([1, 1, 3], center=true);
    translate([15, 14, 3.5]) cube([1, 1, 7], center=true);
    translate([15, 15, 1.5]) cube([1, 1, 3], center=true);
    translate([15, 16, 3.5]) cube([1, 1, 7], center=true);
    translate([15, 17, 1.5]) cube([1, 1, 3], center=true);
    translate([15, 18, 3.5]) cube([1, 1, 7], center=true);
    translate([15, 19, 1.5]) cube([1, 1, 3], center=true);
    translate([15, 20, 3.5]) cube([1, 1, 7], center=true);
    translate([15, 21, 1.5]) cube([1, 1, 3], center=true);
    translate([15, 22, 3.5]) cube([1, 1, 7], center=true);
    translate([15, 23, 1.5]) cube([1, 1, 3], center=true);
    translate([15, 24, 3.5]) cube([1, 1, 7], center=true);
    translate([15, 25, 1.5]) cube([1, 1, 3], center=true);
    translate([15, 26, 3.5]) cube([1, 1, 7], center=true);
    translate([15, 27, 1.5]) cube([1, 1, 3], center=true);
    translate([16, 0, 3.5]) cube([1, 1, 7], center=true);
    translate([16, 1, 1.5]) cube([1, 1, 3], center=true);
    translate([16, 2, 3.5]) cube([1, 1, 7], center=true);
    translate([16, 3, 1.5]) cube([1, 1, 3], center=true);
    translate([16, 4, 3.5]) cube([1, 1, 7], center=true);
    translate([16, 5, 1.5]) cube([1, 1, 3], center=true);
    translate([16, 6, 3.5]) cube([1, 1, 7], center=true);
    translate([16, 7, 1.5]) cube([1, 1, 3], center=true);
    translate([16, 8, 3.5]) cube([1, 1, 7], center=true);
    translate([16, 9, 1.5]) cube([1, 1, 3], center=true);
    translate([16, 10, 3.5]) cube([1, 1, 7], center=true);
    translate([16, 11, 1.5]) cube([1, 1, 3], center=true);
    translate([16, 12, 3.5]) cube([1, 1, 7], center=true);
    translate([16, 13, 1.5]) cube([1, 1, 3], center=true);
    translate([16, 14, 3.5]) cube([1, 1, 7], center=true);
    translate([16, 15, 1.5]) cube([1, 1, 3], center=true);
    translate([16, 16, 3.5]) cube([1, 1, 7], center=true);
    translate([16, 17, 1.5]) cube([1, 1, 3], center=true);
    translate([16, 18, 3.5]) cube([1, 1, 7], center=true);
    translate([16, 19, 1.5]) cube([1, 1, 3], center=true);
    translate([16, 20, 3.5]) cube([1, 1, 7], center=true);
    translate([16, 21, 1.5]) cube([1, 1, 3], center=true);
    translate([16, 22, 3.5]) cube([1, 1, 7], center=true);
    translate([16, 23, 1.5]) cube([1, 1, 3], center=true);
    translate([16, 24, 3.5]) cube([1, 1, 7], center=true);
    translate([16, 25, 1.5]) cube([1, 1, 3], center=true);
    translate([16, 26, 3.5]) cube([1, 1, 7], center=true);
    translate([16, 27, 1.5]) cube([1, 1, 3], center=true);
    translate([17, 0, 3.5]) cube([1, 1, 7], center=true);
    translate([17, 1, 1.5]) cube([1, 1, 3], center=true);
    translate([17, 2, 3.5]) cube([1, 1, 7], center=true);
    translate([17, 3, 1.5]) cube([1, 1, 3], center=true);
    translate([17, 4, 3.5]) cube([1, 1, 7], center=true);
    translate([17, 5, 1.5]) cube([1, 1, 3], center=true);
    translate([17, 6, 3.5]) cube([1, 1, 7], center=true);
    translate([17, 7, 1.5]) cube([1, 1, 3], center=true);
    translate([17, 8, 3.5]) cube([1, 1, 7], center=true);
    translate([17, 9, 1.5]) cube([1, 1, 3], center=true);
    translate([17, 10, 3.5]) cube([1, 1, 7], center=true);
    translate([17, 11, 1.5]) cube([1, 1, 3], center=true);
    translate([17, 12, 3.5]) cube([1, 1, 7], center=true);
    translate([17, 13, 1.5]) cube([1, 1, 3], center=true);
    translate([17, 14, 3.5]) cube([1, 1, 7], center=true);
    translate([17, 15, 1.5]) cube([1, 1, 3], center=true);
    translate([17, 16, 3.5]) cube([1, 1, 7], center=true);
    translate([17, 17, 1.5]) cube([1, 1, 3], center=true);
    translate([17, 18, 3.5]) cube([1, 1, 7], center=true);
    translate([17, 19, 1.5]) cube([1, 1, 3], center=true);
    translate([17, 20, 3.5]) cube([1, 1, 7], center=true);
    translate([17, 21, 1.5]) cube([1, 1, 3], center=true);
    translate([17, 22, 3.5]) cube([1, 1, 7], center=true);
    translate([17, 23, 1.5]) cube([1, 1, 3], center=true);
    translate([17, 24, 3.5]) cube([1, 1, 7], center=true);
    translate([17, 25, 1.5]) cube([1, 1, 3], center=true);
    translate([17, 26, 3.5]) cube([1, 1, 7], center=true);
    translate([17, 27, 1.5]) cube([1, 1, 3], center=true);
    translate([18, 0, 3.5]) cube([1, 1, 7], center=true);
    translate([18, 1, 1.5]) cube([1, 1, 3], center=true);
    translate([18, 2, 3.5]) cube([1, 1, 7], center=true);
    translate([18, 3, 1.5]) cube([1, 1, 3], center=true);
    translate([18, 4, 3.5]) cube([1, 1, 7], center=true);
    translate([18, 5, 1.5]) cube([1, 1, 3], center=true);
    translate([18, 6, 3.5]) cube([1, 1, 7], center=true);
    translate([18, 7, 1.5]) cube([1, 1, 3], center=true);
    translate([18, 8, 3.5]) cube([1, 1, 7], center=true);
    translate([18, 9, 1.5]) cube([1, 1, 3], center=true);
    translate([18, 10, 3.5]) cube([1, 1, 7], center=true);
    translate([18, 11, 1.5]) cube([1, 1, 3], center=true);
    translate([18, 12, 3.5]) cube([1, 1, 7], center=true);
    translate([18, 13, 1.5]) cube([1, 1, 3], center=true);
    translate([18, 14, 3.5]) cube([1, 1, 7], center=true);
    translate([18, 15, 1.5]) cube([1, 1, 3], center=true);
    translate([18, 16, 3.5]) cube([1, 1, 7], center=true);
    translate([18, 17, 1.5]) cube([1, 1, 3], center=true);
    translate([18, 18, 3.5]) cube([1, 1, 7], center=true);
    translate([18, 19, 1.5]) cube([1, 1, 3], center=true);
    translate([18, 20, 3.5]) cube([1, 1, 7], center=true);
    translate([18, 21, 1.5]) cube([1, 1, 3], center=true);
    translate([18, 22, 3.5]) cube([1, 1, 7], center=true);
    translate([18, 23, 1.5]) cube([1, 1, 3], center=true);
    translate([18, 24, 3.5]) cube([1, 1, 7], center=true);
    translate([18, 25, 1.5]) cube([1, 1, 3], center=true);
    translate([18, 26, 3.5]) cube([1, 1, 7], center=true);
    translate([18, 27, 1.5]) cube([1, 1, 3], center=true);
    translate([19, 0, 3.5]) cube([1, 1, 7], center=true);
    translate([19, 1, 1.5]) cube([1, 1, 3], center=true);
    translate([19, 2, 3.5]) cube([1, 1, 7], center=true);
    translate([19, 3, 1.5]) cube([1, 1, 3], center=true);
    translate([19, 4, 3.5]) cube([1, 1, 7], center=true);
    translate([19, 5, 1.5]) cube([1, 1, 3], center=true);
    translate([19, 6, 3.5]) cube([1, 1, 7], center=true);
    translate([19, 7, 1.5]) cube([1, 1, 3], center=true);
    translate([19, 8, 3.5]) cube([1, 1, 7], center=true);
    translate([19, 9, 1.5]) cube([1, 1, 3], center=true);
    translate([19, 10, 3.5]) cube([1, 1, 7], center=true);
    translate([19, 11, 1.5]) cube([1, 1, 3], center=true);
    translate([19, 12, 3.5]) cube([1, 1, 7], center=true);
    translate([19, 13, 1.5]) cube([1, 1, 3], center=true);
    translate([19, 14, 3.5]) cube([1, 1, 7], center=true);
    translate([19, 15, 1.5]) cube([1, 1, 3], center=true);
    translate([19, 16, 3.5]) cube([1, 1, 7], center=true);
    translate([19, 17, 1.5]) cube([1, 1, 3], center=true);
    translate([19, 18, 3.5]) cube([1, 1, 7], center=true);
    translate([19, 19, 1.5]) cube([1, 1, 3], center=true);
    translate([19, 20, 3.5]) cube([1, 1, 7], center=true);
    translate([19, 21, 1.5]) cube([1, 1, 3], center=true);
    translate([19, 22, 3.5]) cube([1, 1, 7], center=true);
    translate([19, 23, 1.5]) cube([1, 1, 3], center=true);
    translate([19, 24, 3.5]) cube([1, 1, 7], center=true);
    translate([19, 25, 1.5]) cube([1, 1, 3], center=true);
    translate([19, 26, 3.5]) cube([1, 1, 7], center=true);
    translate([19, 27, 1.5]) cube([1, 1, 3], center=true);
    translate([20, 0, 3.5]) cube([1, 1, 7], center=true);
    translate([20, 1, 1.5]) cube([1, 1, 3], center=true);
    translate([20, 2, 3.5]) cube([1, 1, 7], center=true);
    translate([20, 3, 1.5]) cube([1, 1, 3], center=true);
    translate([20, 4, 3.5]) cube([1, 1, 7], center=true);
    translate([20, 5, 1.5]) cube([1, 1, 3], center=true);
    translate([20, 6, 3.5]) cube([1, 1, 7], center=true);
    translate([20, 7, 1.5]) cube([1, 1, 3], center=true);
    translate([20, 8, 3.5]) cube([1, 1, 7], center=true);
    translate([20, 9, 1.5]) cube([1, 1, 3], center=true);
    translate([20, 10, 3.5]) cube([1, 1, 7], center=true);
    translate([20, 11, 1.5]) cube([1, 1, 3], center=true);
    translate([20, 12, 3.5]) cube([1, 1, 7], center=true);
    translate([20, 13, 1.5]) cube([1, 1, 3], center=true);
    translate([20, 14, 3.5]) cube([1, 1, 7], center=true);
    translate([20, 15, 1.5]) cube([1, 1, 3], center=true);
    translate([20, 16, 3.5]) cube([1, 1, 7], center=true);
    translate([20, 17, 1.5]) cube([1, 1, 3], center=true);
    translate([20, 18, 3.5]) cube([1, 1, 7], center=true);
    translate([20, 19, 1.5]) cube([1, 1, 3], center=true);
    translate([20, 20, 3.5]) cube([1, 1, 7], center=true);
    translate([20, 21, 1.5]) cube([1, 1, 3], center=true);
    translate([20, 22, 3.5]) cube([1, 1, 7], center=true);
    translate([20, 23, 1.5]) cube([1, 1, 3], center=true);
    translate([20, 24, 3.5]) cube([1, 1, 7], center=true);
    translate([20, 25, 1.5]) cube([1, 1, 3], center=true);
    translate([20, 26, 3.5]) cube([1, 1, 7], center=true);
    translate([20, 27, 1.5]) cube([1, 1, 3], center=true);
    translate([21, 0, 3.5]) cube([1, 1, 7], center=true);
    translate([21, 1, 1.5]) cube([1, 1, 3], center=true);
    translate([21, 2, 3.5]) cube([1, 1, 7], center=true);
    translate([21, 3, 1.5]) cube([1, 1, 3], center=true);
    translate([21, 4, 3.5]) cube([1, 1, 7], center=true);
    translate([21, 5, 1.5]) cube([1, 1, 3], center=true);
    translate([21, 6, 3.5]) cube([1, 1, 7], center=true);
    translate([21, 7, 1.5]) cube([1, 1, 3], center=true);
    translate([21, 8, 3.5]) cube([1, 1, 7], center=true);
    translate([21, 9, 1.5]) cube([1, 1, 3], center=true);
    translate([21, 10, 3.5]) cube([1, 1, 7], center=true);
    translate([21, 11, 1.5]) cube([1, 1, 3], center=true);
    translate([21, 12, 3.5]) cube([1, 1, 7], center=true);
    translate([21, 13, 1.5]) cube([1, 1, 3], center=true);
    translate([21, 14, 3.5]) cube([1, 1, 7], center=true);
    translate([21, 15, 1.5]) cube([1, 1, 3], center=true);
    translate([21, 16, 3.5]) cube([1, 1, 7], center=true);
    translate([21, 17, 1.5]) cube([1, 1, 3], center=true);
    translate([21, 18, 3.5]) cube([1, 1, 7], center=true);
    translate([21, 19, 1.5]) cube([1, 1, 3], center=true);
    translate([21, 20, 3.5]) cube([1, 1, 7], center=true);
    translate([21, 21, 1.5]) cube([1, 1, 3], center=true);
    translate([21, 22, 3.5]) cube([1, 1, 7], center=true);
    translate([21, 23, 1.5]) cube([1, 1, 3], center=true);
    translate([21, 24, 3.5]) cube([1, 1, 7], center=true);
    translate([21, 25, 1.5]) cube([1, 1, 3], center=true);
    translate([21, 26, 3.5]) cube([1, 1, 7], center=true);
    translate([21, 27, 1.5]) cube([1, 1, 3], center=true);
    translate([22, 0, 3.5]) cube([1, 1, 7], center=true);
    translate([22, 1, 1.5]) cube([1, 1, 3], center=true);
    translate([22, 2, 3.5]) cube([1, 1, 7], center=true);
    translate([22, 3, 1.5]) cube([1, 1, 3], center=true);
    translate([22, 4, 3.5]) cube([1, 1, 7], center=true);
    translate([22, 5, 1.5]) cube([1, 1, 3], center=true);
    translate([22, 6, 3.5]) cube([1, 1, 7], center=true);
    translate([22, 7, 1.5]) cube([1, 1, 3], center=true);
    translate([22, 8, 3.5]) cube([1, 1, 7], center=true);
    translate([22, 9, 1.5]) cube([1, 1, 3], center=true);
    translate([22, 10, 3.5]) cube([1, 1, 7], center=true);
    translate([22, 11, 1.5]) cube([1, 1, 3], center=true);
    translate([22, 12, 3.5]) cube([1, 1, 7], center=true);
    translate([22, 13, 1.5]) cube([1, 1, 3], center=true);
    translate([22, 14, 3.5]) cube([1, 1, 7], center=true);
    translate([22, 15, 1.5]) cube([1, 1, 3], center=true);
    translate([22, 16, 3.5]) cube([1, 1, 7], center=true);
    translate([22, 17, 1.5]) cube([1, 1, 3], center=true);
    translate([22, 18, 3.5]) cube([1, 1, 7], center=true);
    translate([22, 19, 1.5]) cube([1, 1, 3], center=true);
    translate([22, 20, 3.5]) cube([1, 1, 7], center=true);
    translate([22, 21, 1.5]) cube([1, 1, 3], center=true);
    translate([22, 22, 3.5]) cube([1, 1, 7], center=true);
    translate([22, 23, 1.5]) cube([1, 1, 3], center=true);
    translate([22, 24, 3.5]) cube([1, 1, 7], center=true);
    translate([22, 25, 1.5]) cube([1, 1, 3], center=true);
    translate([22, 26, 3.5]) cube([1, 1, 7], center=true);
    translate([22, 27, 1.5]) cube([1, 1, 3], center=true);
    translate([23, 0, 3.5]) cube([1, 1, 7], center=true);
    translate([23, 1, 1.5]) cube([1, 1, 3], center=true);
    translate([23, 2, 3.5]) cube([1, 1, 7], center=true);
    translate([23, 3, 1.5]) cube([1, 1, 3], center=true);
    translate([23, 4, 3.5]) cube([1, 1, 7], center=true);
    translate([23, 5, 1.5]) cube([1, 1, 3], center=true);
    translate([23, 6, 3.5]) cube([1, 1, 7], center=true);
    translate([23, 7, 1.5]) cube([1, 1, 3], center=true);
    translate([23, 8, 3.5]) cube([1, 1, 7], center=true);
    translate([23, 9, 1.5]) cube([1, 1, 3], center=true);
    translate([23, 10, 3.5]) cube([1, 1, 7], center=true);
    translate([23, 11, 1.5]) cube([1, 1, 3], center=true);
    translate([23, 12, 3.5]) cube([1, 1, 7], center=true);
    translate([23, 13, 1.5]) cube([1, 1, 3], center=true);
    translate([23, 14, 3.5]) cube([1, 1, 7], center=true);
    translate([23, 15, 1.5]) cube([1, 1, 3], center=true);
    translate([23, 16, 3.5]) cube([1, 1, 7], center=true);
    translate([23, 17, 1.5]) cube([1, 1, 3], center=true);
    translate([23, 18, 3.5]) cube([1, 1, 7], center=true);
    translate([23, 19, 1.5]) cube([1, 1, 3], center=true);
    translate([23, 20, 3.5]) cube([1, 1, 7], center=true);
    translate([23, 21, 1.5]) cube([1, 1, 3], center=true);
    translate([23, 22, 3.5]) cube([1, 1, 7], center=true);
    translate([23, 23, 1.5]) cube([1, 1, 3], center=true);
    translate([23, 24, 3.5]) cube([1, 1, 7], center=true);
    translate([23, 25, 1.5]) cube([1, 1, 3], center=true);
    translate([23, 26, 3.5]) cube([1, 1, 7], center=true);
    translate([23, 27, 1.5]) cube([1, 1, 3], center=true);
    translate([24, 0, 3.5]) cube([1, 1, 7], center=true);
    translate([24, 1, 1.5]) cube([1, 1, 3], center=true);
    translate([24, 2, 3.5]) cube([1, 1, 7], center=true);
    translate([24, 3, 1.5]) cube([1, 1, 3], center=true);
    translate([24, 4, 3.5]) cube([1, 1, 7], center=true);
    translate([24, 5, 1.5]) cube([1, 1, 3], center=true);
    translate([24, 6, 3.5]) cube([1, 1, 7], center=true);
    translate([24, 7, 1.5]) cube([1, 1, 3], center=true);
    translate([24, 8, 3.5]) cube([1, 1, 7], center=true);
    translate([24, 9, 1.5]) cube([1, 1, 3], center=true);
    translate([24, 10, 3.5]) cube([1, 1, 7], center=true);
    translate([24, 11, 1.5]) cube([1, 1, 3], center=true);
    translate([24, 12, 3.5]) cube([1, 1, 7], center=true);
    translate([24, 13, 1.5]) cube([1, 1, 3], center=true);
    translate([24, 14, 3.5]) cube([1, 1, 7], center=true);
    translate([24, 15, 1.5]) cube([1, 1, 3], center=true);
    translate([24, 16, 3.5]) cube([1, 1, 7], center=true);
    translate([24, 17, 1.5]) cube([1, 1, 3], center=true);
    translate([24, 18, 3.5]) cube([1, 1, 7], center=true);
    translate([24, 19, 1.5]) cube([1, 1, 3], center=true);
    translate([24, 20, 3.5]) cube([1, 1, 7], center=true);
    translate([24, 21, 1.5]) cube([1, 1, 3], center=true);
    translate([24, 22, 3.5]) cube([1, 1, 7], center=true);
    translate([24, 23, 1.5]) cube([1, 1, 3], center=true);
    translate([24, 24, 3.5]) cube([1, 1, 7], center=true);
    translate([24, 25, 1.5]) cube([1, 1, 3], center=true);
    translate([24, 26, 3.5]) cube([1, 1, 7], center=true);
    translate([24, 27, 1.5]) cube([1, 1, 3], center=true);
    translate([25, 0, 3.5]) cube([1, 1, 7], center=true);
    translate([25, 1, 1.5]) cube([1, 1, 3], center=true);
    translate([25, 2, 3.5]) cube([1, 1, 7], center=true);
    translate([25, 3, 1.5]) cube([1, 1, 3], center=true);
    translate([25, 4, 3.5]) cube([1, 1, 7], center=true);
    translate([25, 5, 1.5]) cube([1, 1, 3], center=true);
    translate([25, 6, 3.5]) cube([1, 1, 7], center=true);
    translate([25, 7, 1.5]) cube([1, 1, 3], center=true);
    translate([25, 8, 3.5]) cube([1, 1, 7], center=true);
    translate([25, 9, 1.5]) cube([1, 1, 3], center=true);
    translate([25, 10, 3.5]) cube([1, 1, 7], center=true);
    translate([25, 11, 1.5]) cube([1, 1, 3], center=true);
    translate([25, 12, 3.5]) cube([1, 1, 7], center=true);
    translate([25, 13, 1.5]) cube([1, 1, 3], center=true);
    translate([25, 14, 3.5]) cube([1, 1, 7], center=true);
    translate([25, 15, 1.5]) cube([1, 1, 3], center=true);
    translate([25, 16, 3.5]) cube([1, 1, 7], center=true);
    translate([25, 17, 1.5]) cube([1, 1, 3], center=true);
    translate([25, 18, 3.5]) cube([1, 1, 7], center=true);
    translate([25, 19, 1.5]) cube([1, 1, 3], center=true);
    translate([25, 20, 3.5]) cube([1, 1, 7], center=true);
    translate([25, 21, 1.5]) cube([1, 1, 3], center=true);
    translate([25, 22, 3.5]) cube([1, 1, 7], center=true);
    translate([25, 23, 1.5]) cube([1, 1, 3], center=true);
    translate([25, 24, 3.5]) cube([1, 1, 7], center=true);
    translate([25, 25, 1.5]) cube([1, 1, 3], center=true);
    translate([25, 26, 3.5]) cube([1, 1, 7], center=true);
    translate([25, 27, 1.5]) cube([1, 1, 3], center=true);
    translate([26, 0, 3.5]) cube([1, 1, 7], center=true);
    translate([26, 1, 1.5]) cube([1, 1, 3], center=true);
    translate([26, 2, 3.5]) cube([1, 1, 7], center=true);
    translate([26, 3, 1.5]) cube([1, 1, 3], center=true);
    translate([26, 4, 3.5]) cube([1, 1, 7], center=true);
    translate([26, 5, 1.5]) cube([1, 1, 3], center=true);
    translate([26, 6, 3.5]) cube([1, 1, 7], center=true);
    translate([26, 7, 1.5]) cube([1, 1, 3], center=true);
    translate([26, 8, 3.5]) cube([1, 1, 7], center=true);
    translate([26, 9, 1.5]) cube([1, 1, 3], center=true);
    translate([26, 10, 3.5]) cube([1, 1, 7], center=true);
    translate([26, 11, 1.5]) cube([1, 1, 3], center=true);
    translate([26, 12, 3.5]) cube([1, 1, 7], center=true);
    translate([26, 13, 1.5]) cube([1, 1, 3], center=true);
    translate([26, 14, 3.5]) cube([1, 1, 7], center=true);
    translate([26, 15, 1.5]) cube([1, 1, 3], center=true);
    translate([26, 16, 3.5]) cube([1, 1, 7], center=true);
    translate([26, 17, 1.5]) cube([1, 1, 3], center=true);
    translate([26, 18, 3.5]) cube([1, 1, 7], center=true);
    translate([26, 19, 1.5]) cube([1, 1, 3], center=true);
    translate([26, 20, 3.5]) cube([1, 1, 7], center=true);
    translate([26, 21, 1.5]) cube([1, 1, 3], center=true);
    translate([26, 22, 3.5]) cube([1, 1, 7], center=true);
    translate([26, 23, 1.5]) cube([1, 1, 3], center=true);
    translate([26, 24, 3.5]) cube([1, 1, 7], center=true);
    translate([26, 25, 1.5]) cube([1, 1, 3], center=true);
    translate([26, 26, 3.5]) cube([1, 1, 7], center=true);
    translate([26, 27, 1.5]) cube([1, 1, 3], center=true);
    translate([27, 0, 3.5]) cube([1, 1, 7], center=true);
    translate([27, 1, 1.5]) cube([1, 1, 3], center=true);
    translate([27, 2, 3.5]) cube([1, 1, 7], center=true);
    translate([27, 3, 1.5]) cube([1, 1, 3], center=true);
    translate([27, 4, 3.5]) cube([1, 1, 7], center=true);
    translate([27, 5, 1.5]) cube([1, 1, 3], center=true);
    translate([27, 6, 3.5]) cube([1, 1, 7], center=true);
    translate([27, 7, 1.5]) cube([1, 1, 3], center=true);
    translate([27, 8, 3.5]) cube([1, 1, 7], center=true);
    translate([27, 9, 1.5]) cube([1, 1, 3], center=true);
    translate([27, 10, 3.5]) cube([1, 1, 7], center=true);
    translate([27, 11, 1.5]) cube([1, 1, 3], center=true);
    translate([27, 12, 3.5]) cube([1, 1, 7], center=true);
    translate([27, 13, 1.5]) cube([1, 1, 3], center=true);
    translate([27, 14, 3.5]) cube([1, 1, 7], center=true);
    translate([27, 15, 1.5]) cube([1, 1, 3], center=true);
    translate([27, 16, 3.5]) cube([1, 1, 7], center=true);
    translate([27, 17, 1.5]) cube([1, 1, 3], center=true);
    translate([27, 18, 3.5]) cube([1, 1, 7], center=true);
    translate([27, 19, 1.5]) cube([1, 1, 3], center=true);
    translate([27, 20, 3.5]) cube([1, 1, 7], center=true);
    translate([27, 21, 1.5]) cube([1, 1, 3], center=true);
    translate([27, 22, 3.5]) cube([1, 1, 7], center=true);
    translate([27, 23, 1.5]) cube([1, 1, 3], center=true);
    translate([27, 24, 3.5]) cube([1, 1, 7], center=true);
    translate([27, 25, 1.5]) cube([1, 1, 3], center=true);
    translate([27, 26, 3.5]) cube([1, 1, 7], center=true);
    translate([27, 27, 1.5]) cube([1, 1, 3], center=true);
    translate([28, 0, 3.5]) cube([1, 1, 7], center=true);
    translate([28, 1, 1.5]) cube([1, 1, 3], center=true);
    translate([28, 2, 3.5]) cube([1, 1, 7], center=true);
    translate([28, 3, 1.5]) cube([1, 1, 3], center=true);
    translate([28, 4, 3.5]) cube([1, 1, 7], center=true);
    translate([28, 5, 1.5]) cube([1, 1, 3], center=true);
    translate([28, 6, 3.5]) cube([1, 1, 7], center=true);
    translate([28, 7, 1.5]) cube([1, 1, 3], center=true);
    translate([28, 8, 3.5]) cube([1, 1, 7], center=true);
    translate([28, 9, 1.5]) cube([1, 1, 3], center=true);
    translate([28, 10, 3.5]) cube([1, 1, 7], center=true);
    translate([28, 11, 1.5]) cube([1, 1, 3], center=true);
    translate([28, 12, 3.5]) cube([1, 1, 7], center=true);
    translate([28, 13, 1.5]) cube([1, 1, 3], center=true);
    translate([28, 14, 3.5]) cube([1, 1, 7], center=true);
    translate([28, 15, 1.5]) cube([1, 1, 3], center=true);
    translate([28, 16, 3.5]) cube([1, 1, 7], center=true);
    translate([28, 17, 1.5]) cube([1, 1, 3], center=true);
    translate([28, 18, 3.5]) cube([1, 1, 7], center=true);
    translate([28, 19, 1.5]) cube([1, 1, 3], center=true);
    translate([28, 20, 3.5]) cube([1, 1, 7], center=true);
    translate([28, 21, 1.5]) cube([1, 1, 3], center=true);
    translate([28, 22, 3.5]) cube([1, 1, 7], center=true);
    translate([28, 23, 1.5]) cube([1, 1, 3], center=true);
    translate([28, 24, 3.5]) cube([1, 1, 7], center=true);
    translate([28, 25, -0.5]) color([0, 0, 1]) cube([1, 1, 1], center=true);
}
